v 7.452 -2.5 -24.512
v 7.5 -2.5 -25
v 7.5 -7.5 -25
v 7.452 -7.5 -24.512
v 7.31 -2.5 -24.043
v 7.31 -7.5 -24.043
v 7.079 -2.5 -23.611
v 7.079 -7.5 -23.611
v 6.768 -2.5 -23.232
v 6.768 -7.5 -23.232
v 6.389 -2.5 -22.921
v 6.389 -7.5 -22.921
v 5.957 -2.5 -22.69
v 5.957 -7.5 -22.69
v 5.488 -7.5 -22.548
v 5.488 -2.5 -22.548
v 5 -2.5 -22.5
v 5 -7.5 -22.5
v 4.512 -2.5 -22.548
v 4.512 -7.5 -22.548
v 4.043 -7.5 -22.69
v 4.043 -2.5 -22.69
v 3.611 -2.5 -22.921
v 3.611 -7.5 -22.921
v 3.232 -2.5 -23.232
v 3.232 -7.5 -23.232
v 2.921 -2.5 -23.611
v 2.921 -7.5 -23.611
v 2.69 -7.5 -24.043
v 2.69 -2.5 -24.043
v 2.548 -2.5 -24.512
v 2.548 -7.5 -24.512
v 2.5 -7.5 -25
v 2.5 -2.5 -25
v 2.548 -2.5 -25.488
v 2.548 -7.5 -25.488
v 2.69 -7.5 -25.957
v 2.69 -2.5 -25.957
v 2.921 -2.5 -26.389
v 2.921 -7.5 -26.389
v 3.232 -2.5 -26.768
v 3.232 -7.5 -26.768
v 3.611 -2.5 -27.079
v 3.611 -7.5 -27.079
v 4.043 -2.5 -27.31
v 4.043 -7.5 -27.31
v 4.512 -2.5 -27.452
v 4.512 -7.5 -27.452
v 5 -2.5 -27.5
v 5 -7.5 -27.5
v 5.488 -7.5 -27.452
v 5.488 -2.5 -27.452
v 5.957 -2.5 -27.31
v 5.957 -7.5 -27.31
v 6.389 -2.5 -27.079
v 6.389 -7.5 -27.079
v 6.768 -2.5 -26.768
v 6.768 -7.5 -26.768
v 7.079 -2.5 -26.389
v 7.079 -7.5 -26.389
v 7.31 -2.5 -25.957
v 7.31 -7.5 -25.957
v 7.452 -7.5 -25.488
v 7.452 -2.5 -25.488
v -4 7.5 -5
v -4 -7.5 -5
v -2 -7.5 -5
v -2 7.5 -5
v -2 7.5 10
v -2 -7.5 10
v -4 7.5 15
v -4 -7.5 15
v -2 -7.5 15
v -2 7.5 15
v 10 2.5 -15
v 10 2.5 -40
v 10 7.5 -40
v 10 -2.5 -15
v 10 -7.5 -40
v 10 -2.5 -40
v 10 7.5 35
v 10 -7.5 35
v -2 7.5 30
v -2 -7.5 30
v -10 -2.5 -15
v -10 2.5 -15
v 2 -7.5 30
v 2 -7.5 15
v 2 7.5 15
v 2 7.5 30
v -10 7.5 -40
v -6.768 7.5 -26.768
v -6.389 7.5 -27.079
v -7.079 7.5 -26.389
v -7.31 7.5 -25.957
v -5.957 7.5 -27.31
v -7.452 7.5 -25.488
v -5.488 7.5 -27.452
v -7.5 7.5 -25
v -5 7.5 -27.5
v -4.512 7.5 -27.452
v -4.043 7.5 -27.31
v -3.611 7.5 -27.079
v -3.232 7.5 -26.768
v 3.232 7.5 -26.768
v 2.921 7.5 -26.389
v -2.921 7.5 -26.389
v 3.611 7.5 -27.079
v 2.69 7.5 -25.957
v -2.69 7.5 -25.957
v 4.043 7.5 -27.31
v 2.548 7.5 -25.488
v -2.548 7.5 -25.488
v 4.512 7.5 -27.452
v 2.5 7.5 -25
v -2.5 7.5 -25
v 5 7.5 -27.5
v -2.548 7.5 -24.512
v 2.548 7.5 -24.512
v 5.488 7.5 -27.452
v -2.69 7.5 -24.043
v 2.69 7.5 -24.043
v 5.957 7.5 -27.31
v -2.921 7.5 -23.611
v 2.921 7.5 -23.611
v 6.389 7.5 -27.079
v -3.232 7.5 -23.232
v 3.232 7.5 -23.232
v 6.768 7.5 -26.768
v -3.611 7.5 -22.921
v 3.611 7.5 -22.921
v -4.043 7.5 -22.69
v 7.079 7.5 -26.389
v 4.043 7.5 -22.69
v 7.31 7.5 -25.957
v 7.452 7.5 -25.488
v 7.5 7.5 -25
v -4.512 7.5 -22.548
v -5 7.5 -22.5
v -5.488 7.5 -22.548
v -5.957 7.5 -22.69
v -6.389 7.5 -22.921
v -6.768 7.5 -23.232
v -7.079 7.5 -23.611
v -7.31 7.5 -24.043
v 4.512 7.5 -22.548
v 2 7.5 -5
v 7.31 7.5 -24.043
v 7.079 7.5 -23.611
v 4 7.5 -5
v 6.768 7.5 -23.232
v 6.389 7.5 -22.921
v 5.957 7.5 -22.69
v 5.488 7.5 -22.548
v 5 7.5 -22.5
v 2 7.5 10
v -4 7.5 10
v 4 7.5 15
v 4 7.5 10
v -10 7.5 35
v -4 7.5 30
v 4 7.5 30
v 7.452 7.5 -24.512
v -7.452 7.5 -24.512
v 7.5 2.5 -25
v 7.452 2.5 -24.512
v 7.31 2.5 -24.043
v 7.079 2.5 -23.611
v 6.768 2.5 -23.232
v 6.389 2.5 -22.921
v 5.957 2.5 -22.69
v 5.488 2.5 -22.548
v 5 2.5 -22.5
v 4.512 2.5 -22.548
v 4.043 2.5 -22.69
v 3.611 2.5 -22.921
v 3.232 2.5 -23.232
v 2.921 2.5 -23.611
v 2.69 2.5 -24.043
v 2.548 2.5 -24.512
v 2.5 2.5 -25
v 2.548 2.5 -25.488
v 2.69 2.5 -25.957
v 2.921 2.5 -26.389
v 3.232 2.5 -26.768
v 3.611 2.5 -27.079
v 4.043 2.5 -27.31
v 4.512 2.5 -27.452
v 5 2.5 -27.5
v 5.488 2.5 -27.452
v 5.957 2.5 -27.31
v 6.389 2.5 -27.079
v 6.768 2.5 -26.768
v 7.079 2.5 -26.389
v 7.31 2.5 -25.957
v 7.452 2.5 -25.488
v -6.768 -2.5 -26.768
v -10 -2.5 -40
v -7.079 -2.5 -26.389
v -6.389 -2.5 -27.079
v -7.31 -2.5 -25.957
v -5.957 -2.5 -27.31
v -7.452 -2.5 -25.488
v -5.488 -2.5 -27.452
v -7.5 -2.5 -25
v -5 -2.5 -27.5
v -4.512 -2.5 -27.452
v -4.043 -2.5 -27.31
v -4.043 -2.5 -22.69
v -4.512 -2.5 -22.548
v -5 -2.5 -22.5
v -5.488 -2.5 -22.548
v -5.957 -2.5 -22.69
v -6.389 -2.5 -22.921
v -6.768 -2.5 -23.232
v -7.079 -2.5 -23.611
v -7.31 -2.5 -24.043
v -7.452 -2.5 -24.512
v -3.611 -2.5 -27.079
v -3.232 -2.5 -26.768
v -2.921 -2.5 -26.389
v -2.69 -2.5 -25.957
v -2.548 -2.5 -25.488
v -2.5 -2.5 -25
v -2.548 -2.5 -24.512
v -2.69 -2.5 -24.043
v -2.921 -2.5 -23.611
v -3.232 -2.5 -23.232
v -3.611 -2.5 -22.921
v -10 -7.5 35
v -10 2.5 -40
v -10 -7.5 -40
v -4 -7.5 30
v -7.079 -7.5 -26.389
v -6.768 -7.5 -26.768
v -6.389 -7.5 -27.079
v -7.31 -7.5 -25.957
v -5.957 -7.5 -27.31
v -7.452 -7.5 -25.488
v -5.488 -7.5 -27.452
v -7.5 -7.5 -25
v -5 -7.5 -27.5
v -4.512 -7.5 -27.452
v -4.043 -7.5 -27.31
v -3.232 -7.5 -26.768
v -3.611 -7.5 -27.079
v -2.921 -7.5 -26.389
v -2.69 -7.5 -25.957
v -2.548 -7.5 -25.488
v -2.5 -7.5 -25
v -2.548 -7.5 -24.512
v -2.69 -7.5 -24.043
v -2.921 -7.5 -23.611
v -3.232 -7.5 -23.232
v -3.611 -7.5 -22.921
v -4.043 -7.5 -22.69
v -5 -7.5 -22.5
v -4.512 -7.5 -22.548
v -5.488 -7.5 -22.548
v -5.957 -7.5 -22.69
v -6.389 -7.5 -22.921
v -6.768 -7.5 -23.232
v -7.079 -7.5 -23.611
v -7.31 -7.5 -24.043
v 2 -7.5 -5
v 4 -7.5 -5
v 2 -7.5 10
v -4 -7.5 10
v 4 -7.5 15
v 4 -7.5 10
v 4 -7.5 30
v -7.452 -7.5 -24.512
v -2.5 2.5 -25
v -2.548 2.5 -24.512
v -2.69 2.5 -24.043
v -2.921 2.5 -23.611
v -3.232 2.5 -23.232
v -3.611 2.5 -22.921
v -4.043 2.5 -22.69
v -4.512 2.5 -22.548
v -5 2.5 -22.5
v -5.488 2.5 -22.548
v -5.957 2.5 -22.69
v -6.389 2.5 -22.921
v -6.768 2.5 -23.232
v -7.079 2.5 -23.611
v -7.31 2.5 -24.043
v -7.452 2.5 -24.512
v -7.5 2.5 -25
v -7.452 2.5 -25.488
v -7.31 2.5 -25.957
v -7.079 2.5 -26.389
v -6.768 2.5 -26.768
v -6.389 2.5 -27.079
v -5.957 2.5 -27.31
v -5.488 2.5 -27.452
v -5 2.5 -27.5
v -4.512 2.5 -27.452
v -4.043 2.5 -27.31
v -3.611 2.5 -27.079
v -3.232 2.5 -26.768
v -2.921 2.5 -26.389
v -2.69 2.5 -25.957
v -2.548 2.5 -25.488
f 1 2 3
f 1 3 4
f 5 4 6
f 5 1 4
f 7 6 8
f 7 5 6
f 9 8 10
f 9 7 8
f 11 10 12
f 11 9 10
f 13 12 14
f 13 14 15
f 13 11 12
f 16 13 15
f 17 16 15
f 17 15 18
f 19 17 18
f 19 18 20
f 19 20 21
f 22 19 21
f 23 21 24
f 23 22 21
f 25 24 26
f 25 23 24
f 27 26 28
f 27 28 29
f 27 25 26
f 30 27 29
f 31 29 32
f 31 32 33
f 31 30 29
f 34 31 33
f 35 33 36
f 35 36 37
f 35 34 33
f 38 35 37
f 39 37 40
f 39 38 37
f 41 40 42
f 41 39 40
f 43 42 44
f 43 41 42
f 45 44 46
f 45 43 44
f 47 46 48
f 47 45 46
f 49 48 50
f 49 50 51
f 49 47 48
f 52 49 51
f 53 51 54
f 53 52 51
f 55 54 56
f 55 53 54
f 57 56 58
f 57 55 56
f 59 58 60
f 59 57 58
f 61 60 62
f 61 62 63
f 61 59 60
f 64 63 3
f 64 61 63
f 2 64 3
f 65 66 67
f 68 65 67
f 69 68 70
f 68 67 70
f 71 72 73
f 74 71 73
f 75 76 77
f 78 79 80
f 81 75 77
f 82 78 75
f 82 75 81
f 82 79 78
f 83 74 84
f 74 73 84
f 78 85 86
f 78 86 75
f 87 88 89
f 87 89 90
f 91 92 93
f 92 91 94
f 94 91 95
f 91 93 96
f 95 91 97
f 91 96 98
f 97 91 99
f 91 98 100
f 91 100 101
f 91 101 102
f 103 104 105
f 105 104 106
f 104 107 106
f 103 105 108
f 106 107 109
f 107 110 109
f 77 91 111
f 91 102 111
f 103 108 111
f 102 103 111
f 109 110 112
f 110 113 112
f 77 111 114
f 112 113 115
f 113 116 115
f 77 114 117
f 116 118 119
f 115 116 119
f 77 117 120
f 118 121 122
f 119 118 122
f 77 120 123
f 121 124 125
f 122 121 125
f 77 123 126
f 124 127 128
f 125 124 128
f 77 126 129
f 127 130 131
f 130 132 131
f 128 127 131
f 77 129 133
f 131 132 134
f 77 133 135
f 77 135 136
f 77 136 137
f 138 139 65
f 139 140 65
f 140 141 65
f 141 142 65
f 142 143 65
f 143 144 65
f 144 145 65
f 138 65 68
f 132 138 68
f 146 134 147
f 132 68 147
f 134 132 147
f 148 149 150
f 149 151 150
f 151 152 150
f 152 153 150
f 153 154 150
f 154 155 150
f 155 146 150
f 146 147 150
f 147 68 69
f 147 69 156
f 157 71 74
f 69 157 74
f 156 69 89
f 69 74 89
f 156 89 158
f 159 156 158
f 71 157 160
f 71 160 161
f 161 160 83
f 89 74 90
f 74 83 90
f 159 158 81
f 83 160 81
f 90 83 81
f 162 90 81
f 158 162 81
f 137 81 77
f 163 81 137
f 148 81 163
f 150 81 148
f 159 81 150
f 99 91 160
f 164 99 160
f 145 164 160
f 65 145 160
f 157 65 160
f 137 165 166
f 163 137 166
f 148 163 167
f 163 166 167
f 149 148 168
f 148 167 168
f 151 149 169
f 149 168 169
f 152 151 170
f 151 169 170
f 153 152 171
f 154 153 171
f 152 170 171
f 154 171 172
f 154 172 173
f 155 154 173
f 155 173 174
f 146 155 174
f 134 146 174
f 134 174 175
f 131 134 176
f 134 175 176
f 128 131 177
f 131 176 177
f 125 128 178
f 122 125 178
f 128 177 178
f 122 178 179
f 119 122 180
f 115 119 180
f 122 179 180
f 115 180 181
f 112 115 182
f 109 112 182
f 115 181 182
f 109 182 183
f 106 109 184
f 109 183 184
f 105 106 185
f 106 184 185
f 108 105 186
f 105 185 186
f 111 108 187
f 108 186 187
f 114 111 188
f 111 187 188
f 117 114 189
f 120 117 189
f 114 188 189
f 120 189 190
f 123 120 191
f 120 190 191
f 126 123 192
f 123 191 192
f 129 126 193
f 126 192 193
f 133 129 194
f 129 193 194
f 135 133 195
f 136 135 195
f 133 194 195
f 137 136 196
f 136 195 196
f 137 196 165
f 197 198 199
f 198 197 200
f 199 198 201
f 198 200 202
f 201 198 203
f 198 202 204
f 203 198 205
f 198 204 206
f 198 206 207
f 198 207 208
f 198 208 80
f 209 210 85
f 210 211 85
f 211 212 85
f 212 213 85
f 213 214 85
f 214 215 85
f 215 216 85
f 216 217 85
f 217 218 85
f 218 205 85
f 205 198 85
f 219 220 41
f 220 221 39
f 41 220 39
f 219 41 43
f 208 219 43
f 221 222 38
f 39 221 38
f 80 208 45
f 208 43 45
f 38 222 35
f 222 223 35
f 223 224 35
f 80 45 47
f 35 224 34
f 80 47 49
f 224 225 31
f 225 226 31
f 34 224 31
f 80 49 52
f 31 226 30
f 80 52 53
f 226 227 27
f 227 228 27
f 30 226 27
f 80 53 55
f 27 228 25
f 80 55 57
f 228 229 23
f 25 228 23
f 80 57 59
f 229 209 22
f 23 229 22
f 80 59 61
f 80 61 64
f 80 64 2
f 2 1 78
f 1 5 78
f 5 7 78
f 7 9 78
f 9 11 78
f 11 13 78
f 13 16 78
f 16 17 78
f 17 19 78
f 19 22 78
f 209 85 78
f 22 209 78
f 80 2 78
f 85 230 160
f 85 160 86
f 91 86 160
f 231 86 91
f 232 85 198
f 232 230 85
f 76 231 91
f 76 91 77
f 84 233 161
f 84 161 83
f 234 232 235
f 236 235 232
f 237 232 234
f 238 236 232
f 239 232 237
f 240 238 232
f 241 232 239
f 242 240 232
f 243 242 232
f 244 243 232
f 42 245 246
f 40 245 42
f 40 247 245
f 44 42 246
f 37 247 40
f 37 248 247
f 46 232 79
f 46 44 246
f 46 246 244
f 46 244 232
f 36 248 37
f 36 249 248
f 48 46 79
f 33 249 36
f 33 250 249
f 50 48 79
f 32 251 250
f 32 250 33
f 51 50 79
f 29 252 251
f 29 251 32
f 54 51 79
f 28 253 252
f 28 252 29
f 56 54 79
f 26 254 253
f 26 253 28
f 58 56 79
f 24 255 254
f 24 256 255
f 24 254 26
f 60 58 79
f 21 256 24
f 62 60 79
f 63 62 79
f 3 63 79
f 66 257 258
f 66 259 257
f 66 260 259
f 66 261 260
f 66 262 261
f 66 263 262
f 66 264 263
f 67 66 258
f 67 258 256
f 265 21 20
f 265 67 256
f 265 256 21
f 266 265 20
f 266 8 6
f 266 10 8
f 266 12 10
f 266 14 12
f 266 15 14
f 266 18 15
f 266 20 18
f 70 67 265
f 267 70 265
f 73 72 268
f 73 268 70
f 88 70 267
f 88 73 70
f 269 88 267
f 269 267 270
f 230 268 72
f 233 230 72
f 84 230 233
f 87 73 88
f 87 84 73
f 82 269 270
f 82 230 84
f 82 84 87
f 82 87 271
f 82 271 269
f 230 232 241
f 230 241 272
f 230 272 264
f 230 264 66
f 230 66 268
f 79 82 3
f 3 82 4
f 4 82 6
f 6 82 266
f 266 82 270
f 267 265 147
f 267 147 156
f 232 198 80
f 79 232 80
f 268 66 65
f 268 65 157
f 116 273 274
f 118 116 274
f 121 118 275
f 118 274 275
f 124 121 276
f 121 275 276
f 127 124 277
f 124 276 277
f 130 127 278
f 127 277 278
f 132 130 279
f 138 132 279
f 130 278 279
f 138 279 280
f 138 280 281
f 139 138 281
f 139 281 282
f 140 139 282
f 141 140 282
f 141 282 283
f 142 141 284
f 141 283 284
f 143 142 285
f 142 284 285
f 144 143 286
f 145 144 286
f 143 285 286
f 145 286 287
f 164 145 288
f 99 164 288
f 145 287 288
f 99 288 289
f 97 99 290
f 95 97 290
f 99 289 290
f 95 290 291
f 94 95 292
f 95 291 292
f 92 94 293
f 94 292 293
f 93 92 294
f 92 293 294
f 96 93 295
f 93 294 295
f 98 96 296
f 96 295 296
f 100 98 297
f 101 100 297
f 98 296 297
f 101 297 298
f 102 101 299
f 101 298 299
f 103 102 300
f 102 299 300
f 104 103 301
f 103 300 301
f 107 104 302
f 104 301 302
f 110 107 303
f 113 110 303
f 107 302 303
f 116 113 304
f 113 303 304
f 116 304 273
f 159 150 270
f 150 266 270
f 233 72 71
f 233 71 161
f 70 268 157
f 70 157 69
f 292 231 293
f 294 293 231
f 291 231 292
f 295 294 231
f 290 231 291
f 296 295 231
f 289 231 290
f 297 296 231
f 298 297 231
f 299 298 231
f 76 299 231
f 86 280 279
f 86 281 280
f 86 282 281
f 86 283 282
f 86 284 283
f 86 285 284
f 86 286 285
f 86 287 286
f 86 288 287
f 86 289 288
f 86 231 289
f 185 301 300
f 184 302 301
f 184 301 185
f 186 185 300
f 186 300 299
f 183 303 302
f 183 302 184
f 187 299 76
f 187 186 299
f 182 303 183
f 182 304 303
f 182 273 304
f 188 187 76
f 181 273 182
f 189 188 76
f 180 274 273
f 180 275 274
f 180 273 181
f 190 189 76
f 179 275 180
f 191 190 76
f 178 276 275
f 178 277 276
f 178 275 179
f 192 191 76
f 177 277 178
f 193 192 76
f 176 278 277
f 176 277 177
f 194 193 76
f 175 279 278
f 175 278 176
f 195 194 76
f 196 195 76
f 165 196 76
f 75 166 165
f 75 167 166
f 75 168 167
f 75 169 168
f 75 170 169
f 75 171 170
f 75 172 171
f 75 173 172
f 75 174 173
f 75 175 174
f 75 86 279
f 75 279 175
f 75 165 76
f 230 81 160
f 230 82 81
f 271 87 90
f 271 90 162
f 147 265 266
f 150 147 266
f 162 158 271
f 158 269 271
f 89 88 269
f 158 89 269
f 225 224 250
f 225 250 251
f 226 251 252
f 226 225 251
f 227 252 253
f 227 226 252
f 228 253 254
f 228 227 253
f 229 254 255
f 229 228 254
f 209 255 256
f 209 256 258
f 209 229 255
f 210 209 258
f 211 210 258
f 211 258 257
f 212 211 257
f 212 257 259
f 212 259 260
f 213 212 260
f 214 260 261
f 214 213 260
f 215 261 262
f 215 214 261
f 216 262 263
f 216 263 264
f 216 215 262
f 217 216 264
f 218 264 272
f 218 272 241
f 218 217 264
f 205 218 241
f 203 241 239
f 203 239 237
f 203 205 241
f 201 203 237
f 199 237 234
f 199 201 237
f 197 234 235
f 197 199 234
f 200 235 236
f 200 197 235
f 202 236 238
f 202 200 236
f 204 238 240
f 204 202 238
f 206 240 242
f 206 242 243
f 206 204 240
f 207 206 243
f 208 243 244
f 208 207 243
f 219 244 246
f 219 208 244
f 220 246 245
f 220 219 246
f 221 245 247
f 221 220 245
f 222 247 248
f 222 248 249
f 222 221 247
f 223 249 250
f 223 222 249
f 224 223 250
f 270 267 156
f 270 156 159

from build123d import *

# Parameters (mm, degrees)
F0_W     = 2
F0_H     = 15
F0_W_2   = 20
F0_H_2   = 5
F1_DEPTH = 7.5
F2_START = 2.5
F0_H_3   = 20
F0_R     = 2.5
F0_H_4   = 4.9999991059
F2_DEPTH = 5
F3_START = -2.5
F3_DEPTH = 5


with BuildPart() as f1:
    # F0 (on Front) → F1 (new body, symmetric)
    with BuildSketch(Plane.XZ):
        Polygon((10, -10), (10, 35), (-10, 35), (-10, 17), (-10, 15), (-10, -10), align=None)
        with Locations((-3, 2.5)):
            Rectangle(F0_W, F0_H, mode=Mode.SUBTRACT)
        with Locations((-3, 22.5)):
            Rectangle(F0_W, F0_H, mode=Mode.SUBTRACT)
        with Locations((3, 2.5)):
            Rectangle(F0_W, F0_H, mode=Mode.SUBTRACT)
        with Locations((3, 22.5)):
            Rectangle(F0_W, F0_H, mode=Mode.SUBTRACT)
        with Locations((0, -12.5)):
            Rectangle(F0_W_2, F0_H_2)
    extrude(amount=F1_DEPTH, both=True)

    # F0 (on Front) → F2 (join)
    with BuildSketch(Plane.XZ.offset(F2_START)):
        with Locations((0, -12.5)):
            Rectangle(F0_W_2, F0_H_2)
        with Locations((0, -25)):
            Rectangle(F0_W_2, F0_H_3)
        with Locations((-5, -25)):
            Circle(F0_R, mode=Mode.SUBTRACT)
        with Locations((5, -25)):
            Circle(F0_R, mode=Mode.SUBTRACT)
        with Locations((0, -37.499999553)):
            Rectangle(F0_W_2, F0_H_4)
    extrude(amount=F2_DEPTH)

    # F0 (on Front) → F3 (join)
    with BuildSketch(Plane.XZ.offset(F3_START)):
        with Locations((0, -12.5)):
            Rectangle(F0_W_2, F0_H_2)
        with Locations((0, -25)):
            Rectangle(F0_W_2, F0_H_3)
        with Locations((-5, -25)):
            Circle(F0_R, mode=Mode.SUBTRACT)
        with Locations((5, -25)):
            Circle(F0_R, mode=Mode.SUBTRACT)
        with Locations((0, -37.499999553)):
            Rectangle(F0_W_2, F0_H_4)
    extrude(amount=-F3_DEPTH)


solid = f1.part
